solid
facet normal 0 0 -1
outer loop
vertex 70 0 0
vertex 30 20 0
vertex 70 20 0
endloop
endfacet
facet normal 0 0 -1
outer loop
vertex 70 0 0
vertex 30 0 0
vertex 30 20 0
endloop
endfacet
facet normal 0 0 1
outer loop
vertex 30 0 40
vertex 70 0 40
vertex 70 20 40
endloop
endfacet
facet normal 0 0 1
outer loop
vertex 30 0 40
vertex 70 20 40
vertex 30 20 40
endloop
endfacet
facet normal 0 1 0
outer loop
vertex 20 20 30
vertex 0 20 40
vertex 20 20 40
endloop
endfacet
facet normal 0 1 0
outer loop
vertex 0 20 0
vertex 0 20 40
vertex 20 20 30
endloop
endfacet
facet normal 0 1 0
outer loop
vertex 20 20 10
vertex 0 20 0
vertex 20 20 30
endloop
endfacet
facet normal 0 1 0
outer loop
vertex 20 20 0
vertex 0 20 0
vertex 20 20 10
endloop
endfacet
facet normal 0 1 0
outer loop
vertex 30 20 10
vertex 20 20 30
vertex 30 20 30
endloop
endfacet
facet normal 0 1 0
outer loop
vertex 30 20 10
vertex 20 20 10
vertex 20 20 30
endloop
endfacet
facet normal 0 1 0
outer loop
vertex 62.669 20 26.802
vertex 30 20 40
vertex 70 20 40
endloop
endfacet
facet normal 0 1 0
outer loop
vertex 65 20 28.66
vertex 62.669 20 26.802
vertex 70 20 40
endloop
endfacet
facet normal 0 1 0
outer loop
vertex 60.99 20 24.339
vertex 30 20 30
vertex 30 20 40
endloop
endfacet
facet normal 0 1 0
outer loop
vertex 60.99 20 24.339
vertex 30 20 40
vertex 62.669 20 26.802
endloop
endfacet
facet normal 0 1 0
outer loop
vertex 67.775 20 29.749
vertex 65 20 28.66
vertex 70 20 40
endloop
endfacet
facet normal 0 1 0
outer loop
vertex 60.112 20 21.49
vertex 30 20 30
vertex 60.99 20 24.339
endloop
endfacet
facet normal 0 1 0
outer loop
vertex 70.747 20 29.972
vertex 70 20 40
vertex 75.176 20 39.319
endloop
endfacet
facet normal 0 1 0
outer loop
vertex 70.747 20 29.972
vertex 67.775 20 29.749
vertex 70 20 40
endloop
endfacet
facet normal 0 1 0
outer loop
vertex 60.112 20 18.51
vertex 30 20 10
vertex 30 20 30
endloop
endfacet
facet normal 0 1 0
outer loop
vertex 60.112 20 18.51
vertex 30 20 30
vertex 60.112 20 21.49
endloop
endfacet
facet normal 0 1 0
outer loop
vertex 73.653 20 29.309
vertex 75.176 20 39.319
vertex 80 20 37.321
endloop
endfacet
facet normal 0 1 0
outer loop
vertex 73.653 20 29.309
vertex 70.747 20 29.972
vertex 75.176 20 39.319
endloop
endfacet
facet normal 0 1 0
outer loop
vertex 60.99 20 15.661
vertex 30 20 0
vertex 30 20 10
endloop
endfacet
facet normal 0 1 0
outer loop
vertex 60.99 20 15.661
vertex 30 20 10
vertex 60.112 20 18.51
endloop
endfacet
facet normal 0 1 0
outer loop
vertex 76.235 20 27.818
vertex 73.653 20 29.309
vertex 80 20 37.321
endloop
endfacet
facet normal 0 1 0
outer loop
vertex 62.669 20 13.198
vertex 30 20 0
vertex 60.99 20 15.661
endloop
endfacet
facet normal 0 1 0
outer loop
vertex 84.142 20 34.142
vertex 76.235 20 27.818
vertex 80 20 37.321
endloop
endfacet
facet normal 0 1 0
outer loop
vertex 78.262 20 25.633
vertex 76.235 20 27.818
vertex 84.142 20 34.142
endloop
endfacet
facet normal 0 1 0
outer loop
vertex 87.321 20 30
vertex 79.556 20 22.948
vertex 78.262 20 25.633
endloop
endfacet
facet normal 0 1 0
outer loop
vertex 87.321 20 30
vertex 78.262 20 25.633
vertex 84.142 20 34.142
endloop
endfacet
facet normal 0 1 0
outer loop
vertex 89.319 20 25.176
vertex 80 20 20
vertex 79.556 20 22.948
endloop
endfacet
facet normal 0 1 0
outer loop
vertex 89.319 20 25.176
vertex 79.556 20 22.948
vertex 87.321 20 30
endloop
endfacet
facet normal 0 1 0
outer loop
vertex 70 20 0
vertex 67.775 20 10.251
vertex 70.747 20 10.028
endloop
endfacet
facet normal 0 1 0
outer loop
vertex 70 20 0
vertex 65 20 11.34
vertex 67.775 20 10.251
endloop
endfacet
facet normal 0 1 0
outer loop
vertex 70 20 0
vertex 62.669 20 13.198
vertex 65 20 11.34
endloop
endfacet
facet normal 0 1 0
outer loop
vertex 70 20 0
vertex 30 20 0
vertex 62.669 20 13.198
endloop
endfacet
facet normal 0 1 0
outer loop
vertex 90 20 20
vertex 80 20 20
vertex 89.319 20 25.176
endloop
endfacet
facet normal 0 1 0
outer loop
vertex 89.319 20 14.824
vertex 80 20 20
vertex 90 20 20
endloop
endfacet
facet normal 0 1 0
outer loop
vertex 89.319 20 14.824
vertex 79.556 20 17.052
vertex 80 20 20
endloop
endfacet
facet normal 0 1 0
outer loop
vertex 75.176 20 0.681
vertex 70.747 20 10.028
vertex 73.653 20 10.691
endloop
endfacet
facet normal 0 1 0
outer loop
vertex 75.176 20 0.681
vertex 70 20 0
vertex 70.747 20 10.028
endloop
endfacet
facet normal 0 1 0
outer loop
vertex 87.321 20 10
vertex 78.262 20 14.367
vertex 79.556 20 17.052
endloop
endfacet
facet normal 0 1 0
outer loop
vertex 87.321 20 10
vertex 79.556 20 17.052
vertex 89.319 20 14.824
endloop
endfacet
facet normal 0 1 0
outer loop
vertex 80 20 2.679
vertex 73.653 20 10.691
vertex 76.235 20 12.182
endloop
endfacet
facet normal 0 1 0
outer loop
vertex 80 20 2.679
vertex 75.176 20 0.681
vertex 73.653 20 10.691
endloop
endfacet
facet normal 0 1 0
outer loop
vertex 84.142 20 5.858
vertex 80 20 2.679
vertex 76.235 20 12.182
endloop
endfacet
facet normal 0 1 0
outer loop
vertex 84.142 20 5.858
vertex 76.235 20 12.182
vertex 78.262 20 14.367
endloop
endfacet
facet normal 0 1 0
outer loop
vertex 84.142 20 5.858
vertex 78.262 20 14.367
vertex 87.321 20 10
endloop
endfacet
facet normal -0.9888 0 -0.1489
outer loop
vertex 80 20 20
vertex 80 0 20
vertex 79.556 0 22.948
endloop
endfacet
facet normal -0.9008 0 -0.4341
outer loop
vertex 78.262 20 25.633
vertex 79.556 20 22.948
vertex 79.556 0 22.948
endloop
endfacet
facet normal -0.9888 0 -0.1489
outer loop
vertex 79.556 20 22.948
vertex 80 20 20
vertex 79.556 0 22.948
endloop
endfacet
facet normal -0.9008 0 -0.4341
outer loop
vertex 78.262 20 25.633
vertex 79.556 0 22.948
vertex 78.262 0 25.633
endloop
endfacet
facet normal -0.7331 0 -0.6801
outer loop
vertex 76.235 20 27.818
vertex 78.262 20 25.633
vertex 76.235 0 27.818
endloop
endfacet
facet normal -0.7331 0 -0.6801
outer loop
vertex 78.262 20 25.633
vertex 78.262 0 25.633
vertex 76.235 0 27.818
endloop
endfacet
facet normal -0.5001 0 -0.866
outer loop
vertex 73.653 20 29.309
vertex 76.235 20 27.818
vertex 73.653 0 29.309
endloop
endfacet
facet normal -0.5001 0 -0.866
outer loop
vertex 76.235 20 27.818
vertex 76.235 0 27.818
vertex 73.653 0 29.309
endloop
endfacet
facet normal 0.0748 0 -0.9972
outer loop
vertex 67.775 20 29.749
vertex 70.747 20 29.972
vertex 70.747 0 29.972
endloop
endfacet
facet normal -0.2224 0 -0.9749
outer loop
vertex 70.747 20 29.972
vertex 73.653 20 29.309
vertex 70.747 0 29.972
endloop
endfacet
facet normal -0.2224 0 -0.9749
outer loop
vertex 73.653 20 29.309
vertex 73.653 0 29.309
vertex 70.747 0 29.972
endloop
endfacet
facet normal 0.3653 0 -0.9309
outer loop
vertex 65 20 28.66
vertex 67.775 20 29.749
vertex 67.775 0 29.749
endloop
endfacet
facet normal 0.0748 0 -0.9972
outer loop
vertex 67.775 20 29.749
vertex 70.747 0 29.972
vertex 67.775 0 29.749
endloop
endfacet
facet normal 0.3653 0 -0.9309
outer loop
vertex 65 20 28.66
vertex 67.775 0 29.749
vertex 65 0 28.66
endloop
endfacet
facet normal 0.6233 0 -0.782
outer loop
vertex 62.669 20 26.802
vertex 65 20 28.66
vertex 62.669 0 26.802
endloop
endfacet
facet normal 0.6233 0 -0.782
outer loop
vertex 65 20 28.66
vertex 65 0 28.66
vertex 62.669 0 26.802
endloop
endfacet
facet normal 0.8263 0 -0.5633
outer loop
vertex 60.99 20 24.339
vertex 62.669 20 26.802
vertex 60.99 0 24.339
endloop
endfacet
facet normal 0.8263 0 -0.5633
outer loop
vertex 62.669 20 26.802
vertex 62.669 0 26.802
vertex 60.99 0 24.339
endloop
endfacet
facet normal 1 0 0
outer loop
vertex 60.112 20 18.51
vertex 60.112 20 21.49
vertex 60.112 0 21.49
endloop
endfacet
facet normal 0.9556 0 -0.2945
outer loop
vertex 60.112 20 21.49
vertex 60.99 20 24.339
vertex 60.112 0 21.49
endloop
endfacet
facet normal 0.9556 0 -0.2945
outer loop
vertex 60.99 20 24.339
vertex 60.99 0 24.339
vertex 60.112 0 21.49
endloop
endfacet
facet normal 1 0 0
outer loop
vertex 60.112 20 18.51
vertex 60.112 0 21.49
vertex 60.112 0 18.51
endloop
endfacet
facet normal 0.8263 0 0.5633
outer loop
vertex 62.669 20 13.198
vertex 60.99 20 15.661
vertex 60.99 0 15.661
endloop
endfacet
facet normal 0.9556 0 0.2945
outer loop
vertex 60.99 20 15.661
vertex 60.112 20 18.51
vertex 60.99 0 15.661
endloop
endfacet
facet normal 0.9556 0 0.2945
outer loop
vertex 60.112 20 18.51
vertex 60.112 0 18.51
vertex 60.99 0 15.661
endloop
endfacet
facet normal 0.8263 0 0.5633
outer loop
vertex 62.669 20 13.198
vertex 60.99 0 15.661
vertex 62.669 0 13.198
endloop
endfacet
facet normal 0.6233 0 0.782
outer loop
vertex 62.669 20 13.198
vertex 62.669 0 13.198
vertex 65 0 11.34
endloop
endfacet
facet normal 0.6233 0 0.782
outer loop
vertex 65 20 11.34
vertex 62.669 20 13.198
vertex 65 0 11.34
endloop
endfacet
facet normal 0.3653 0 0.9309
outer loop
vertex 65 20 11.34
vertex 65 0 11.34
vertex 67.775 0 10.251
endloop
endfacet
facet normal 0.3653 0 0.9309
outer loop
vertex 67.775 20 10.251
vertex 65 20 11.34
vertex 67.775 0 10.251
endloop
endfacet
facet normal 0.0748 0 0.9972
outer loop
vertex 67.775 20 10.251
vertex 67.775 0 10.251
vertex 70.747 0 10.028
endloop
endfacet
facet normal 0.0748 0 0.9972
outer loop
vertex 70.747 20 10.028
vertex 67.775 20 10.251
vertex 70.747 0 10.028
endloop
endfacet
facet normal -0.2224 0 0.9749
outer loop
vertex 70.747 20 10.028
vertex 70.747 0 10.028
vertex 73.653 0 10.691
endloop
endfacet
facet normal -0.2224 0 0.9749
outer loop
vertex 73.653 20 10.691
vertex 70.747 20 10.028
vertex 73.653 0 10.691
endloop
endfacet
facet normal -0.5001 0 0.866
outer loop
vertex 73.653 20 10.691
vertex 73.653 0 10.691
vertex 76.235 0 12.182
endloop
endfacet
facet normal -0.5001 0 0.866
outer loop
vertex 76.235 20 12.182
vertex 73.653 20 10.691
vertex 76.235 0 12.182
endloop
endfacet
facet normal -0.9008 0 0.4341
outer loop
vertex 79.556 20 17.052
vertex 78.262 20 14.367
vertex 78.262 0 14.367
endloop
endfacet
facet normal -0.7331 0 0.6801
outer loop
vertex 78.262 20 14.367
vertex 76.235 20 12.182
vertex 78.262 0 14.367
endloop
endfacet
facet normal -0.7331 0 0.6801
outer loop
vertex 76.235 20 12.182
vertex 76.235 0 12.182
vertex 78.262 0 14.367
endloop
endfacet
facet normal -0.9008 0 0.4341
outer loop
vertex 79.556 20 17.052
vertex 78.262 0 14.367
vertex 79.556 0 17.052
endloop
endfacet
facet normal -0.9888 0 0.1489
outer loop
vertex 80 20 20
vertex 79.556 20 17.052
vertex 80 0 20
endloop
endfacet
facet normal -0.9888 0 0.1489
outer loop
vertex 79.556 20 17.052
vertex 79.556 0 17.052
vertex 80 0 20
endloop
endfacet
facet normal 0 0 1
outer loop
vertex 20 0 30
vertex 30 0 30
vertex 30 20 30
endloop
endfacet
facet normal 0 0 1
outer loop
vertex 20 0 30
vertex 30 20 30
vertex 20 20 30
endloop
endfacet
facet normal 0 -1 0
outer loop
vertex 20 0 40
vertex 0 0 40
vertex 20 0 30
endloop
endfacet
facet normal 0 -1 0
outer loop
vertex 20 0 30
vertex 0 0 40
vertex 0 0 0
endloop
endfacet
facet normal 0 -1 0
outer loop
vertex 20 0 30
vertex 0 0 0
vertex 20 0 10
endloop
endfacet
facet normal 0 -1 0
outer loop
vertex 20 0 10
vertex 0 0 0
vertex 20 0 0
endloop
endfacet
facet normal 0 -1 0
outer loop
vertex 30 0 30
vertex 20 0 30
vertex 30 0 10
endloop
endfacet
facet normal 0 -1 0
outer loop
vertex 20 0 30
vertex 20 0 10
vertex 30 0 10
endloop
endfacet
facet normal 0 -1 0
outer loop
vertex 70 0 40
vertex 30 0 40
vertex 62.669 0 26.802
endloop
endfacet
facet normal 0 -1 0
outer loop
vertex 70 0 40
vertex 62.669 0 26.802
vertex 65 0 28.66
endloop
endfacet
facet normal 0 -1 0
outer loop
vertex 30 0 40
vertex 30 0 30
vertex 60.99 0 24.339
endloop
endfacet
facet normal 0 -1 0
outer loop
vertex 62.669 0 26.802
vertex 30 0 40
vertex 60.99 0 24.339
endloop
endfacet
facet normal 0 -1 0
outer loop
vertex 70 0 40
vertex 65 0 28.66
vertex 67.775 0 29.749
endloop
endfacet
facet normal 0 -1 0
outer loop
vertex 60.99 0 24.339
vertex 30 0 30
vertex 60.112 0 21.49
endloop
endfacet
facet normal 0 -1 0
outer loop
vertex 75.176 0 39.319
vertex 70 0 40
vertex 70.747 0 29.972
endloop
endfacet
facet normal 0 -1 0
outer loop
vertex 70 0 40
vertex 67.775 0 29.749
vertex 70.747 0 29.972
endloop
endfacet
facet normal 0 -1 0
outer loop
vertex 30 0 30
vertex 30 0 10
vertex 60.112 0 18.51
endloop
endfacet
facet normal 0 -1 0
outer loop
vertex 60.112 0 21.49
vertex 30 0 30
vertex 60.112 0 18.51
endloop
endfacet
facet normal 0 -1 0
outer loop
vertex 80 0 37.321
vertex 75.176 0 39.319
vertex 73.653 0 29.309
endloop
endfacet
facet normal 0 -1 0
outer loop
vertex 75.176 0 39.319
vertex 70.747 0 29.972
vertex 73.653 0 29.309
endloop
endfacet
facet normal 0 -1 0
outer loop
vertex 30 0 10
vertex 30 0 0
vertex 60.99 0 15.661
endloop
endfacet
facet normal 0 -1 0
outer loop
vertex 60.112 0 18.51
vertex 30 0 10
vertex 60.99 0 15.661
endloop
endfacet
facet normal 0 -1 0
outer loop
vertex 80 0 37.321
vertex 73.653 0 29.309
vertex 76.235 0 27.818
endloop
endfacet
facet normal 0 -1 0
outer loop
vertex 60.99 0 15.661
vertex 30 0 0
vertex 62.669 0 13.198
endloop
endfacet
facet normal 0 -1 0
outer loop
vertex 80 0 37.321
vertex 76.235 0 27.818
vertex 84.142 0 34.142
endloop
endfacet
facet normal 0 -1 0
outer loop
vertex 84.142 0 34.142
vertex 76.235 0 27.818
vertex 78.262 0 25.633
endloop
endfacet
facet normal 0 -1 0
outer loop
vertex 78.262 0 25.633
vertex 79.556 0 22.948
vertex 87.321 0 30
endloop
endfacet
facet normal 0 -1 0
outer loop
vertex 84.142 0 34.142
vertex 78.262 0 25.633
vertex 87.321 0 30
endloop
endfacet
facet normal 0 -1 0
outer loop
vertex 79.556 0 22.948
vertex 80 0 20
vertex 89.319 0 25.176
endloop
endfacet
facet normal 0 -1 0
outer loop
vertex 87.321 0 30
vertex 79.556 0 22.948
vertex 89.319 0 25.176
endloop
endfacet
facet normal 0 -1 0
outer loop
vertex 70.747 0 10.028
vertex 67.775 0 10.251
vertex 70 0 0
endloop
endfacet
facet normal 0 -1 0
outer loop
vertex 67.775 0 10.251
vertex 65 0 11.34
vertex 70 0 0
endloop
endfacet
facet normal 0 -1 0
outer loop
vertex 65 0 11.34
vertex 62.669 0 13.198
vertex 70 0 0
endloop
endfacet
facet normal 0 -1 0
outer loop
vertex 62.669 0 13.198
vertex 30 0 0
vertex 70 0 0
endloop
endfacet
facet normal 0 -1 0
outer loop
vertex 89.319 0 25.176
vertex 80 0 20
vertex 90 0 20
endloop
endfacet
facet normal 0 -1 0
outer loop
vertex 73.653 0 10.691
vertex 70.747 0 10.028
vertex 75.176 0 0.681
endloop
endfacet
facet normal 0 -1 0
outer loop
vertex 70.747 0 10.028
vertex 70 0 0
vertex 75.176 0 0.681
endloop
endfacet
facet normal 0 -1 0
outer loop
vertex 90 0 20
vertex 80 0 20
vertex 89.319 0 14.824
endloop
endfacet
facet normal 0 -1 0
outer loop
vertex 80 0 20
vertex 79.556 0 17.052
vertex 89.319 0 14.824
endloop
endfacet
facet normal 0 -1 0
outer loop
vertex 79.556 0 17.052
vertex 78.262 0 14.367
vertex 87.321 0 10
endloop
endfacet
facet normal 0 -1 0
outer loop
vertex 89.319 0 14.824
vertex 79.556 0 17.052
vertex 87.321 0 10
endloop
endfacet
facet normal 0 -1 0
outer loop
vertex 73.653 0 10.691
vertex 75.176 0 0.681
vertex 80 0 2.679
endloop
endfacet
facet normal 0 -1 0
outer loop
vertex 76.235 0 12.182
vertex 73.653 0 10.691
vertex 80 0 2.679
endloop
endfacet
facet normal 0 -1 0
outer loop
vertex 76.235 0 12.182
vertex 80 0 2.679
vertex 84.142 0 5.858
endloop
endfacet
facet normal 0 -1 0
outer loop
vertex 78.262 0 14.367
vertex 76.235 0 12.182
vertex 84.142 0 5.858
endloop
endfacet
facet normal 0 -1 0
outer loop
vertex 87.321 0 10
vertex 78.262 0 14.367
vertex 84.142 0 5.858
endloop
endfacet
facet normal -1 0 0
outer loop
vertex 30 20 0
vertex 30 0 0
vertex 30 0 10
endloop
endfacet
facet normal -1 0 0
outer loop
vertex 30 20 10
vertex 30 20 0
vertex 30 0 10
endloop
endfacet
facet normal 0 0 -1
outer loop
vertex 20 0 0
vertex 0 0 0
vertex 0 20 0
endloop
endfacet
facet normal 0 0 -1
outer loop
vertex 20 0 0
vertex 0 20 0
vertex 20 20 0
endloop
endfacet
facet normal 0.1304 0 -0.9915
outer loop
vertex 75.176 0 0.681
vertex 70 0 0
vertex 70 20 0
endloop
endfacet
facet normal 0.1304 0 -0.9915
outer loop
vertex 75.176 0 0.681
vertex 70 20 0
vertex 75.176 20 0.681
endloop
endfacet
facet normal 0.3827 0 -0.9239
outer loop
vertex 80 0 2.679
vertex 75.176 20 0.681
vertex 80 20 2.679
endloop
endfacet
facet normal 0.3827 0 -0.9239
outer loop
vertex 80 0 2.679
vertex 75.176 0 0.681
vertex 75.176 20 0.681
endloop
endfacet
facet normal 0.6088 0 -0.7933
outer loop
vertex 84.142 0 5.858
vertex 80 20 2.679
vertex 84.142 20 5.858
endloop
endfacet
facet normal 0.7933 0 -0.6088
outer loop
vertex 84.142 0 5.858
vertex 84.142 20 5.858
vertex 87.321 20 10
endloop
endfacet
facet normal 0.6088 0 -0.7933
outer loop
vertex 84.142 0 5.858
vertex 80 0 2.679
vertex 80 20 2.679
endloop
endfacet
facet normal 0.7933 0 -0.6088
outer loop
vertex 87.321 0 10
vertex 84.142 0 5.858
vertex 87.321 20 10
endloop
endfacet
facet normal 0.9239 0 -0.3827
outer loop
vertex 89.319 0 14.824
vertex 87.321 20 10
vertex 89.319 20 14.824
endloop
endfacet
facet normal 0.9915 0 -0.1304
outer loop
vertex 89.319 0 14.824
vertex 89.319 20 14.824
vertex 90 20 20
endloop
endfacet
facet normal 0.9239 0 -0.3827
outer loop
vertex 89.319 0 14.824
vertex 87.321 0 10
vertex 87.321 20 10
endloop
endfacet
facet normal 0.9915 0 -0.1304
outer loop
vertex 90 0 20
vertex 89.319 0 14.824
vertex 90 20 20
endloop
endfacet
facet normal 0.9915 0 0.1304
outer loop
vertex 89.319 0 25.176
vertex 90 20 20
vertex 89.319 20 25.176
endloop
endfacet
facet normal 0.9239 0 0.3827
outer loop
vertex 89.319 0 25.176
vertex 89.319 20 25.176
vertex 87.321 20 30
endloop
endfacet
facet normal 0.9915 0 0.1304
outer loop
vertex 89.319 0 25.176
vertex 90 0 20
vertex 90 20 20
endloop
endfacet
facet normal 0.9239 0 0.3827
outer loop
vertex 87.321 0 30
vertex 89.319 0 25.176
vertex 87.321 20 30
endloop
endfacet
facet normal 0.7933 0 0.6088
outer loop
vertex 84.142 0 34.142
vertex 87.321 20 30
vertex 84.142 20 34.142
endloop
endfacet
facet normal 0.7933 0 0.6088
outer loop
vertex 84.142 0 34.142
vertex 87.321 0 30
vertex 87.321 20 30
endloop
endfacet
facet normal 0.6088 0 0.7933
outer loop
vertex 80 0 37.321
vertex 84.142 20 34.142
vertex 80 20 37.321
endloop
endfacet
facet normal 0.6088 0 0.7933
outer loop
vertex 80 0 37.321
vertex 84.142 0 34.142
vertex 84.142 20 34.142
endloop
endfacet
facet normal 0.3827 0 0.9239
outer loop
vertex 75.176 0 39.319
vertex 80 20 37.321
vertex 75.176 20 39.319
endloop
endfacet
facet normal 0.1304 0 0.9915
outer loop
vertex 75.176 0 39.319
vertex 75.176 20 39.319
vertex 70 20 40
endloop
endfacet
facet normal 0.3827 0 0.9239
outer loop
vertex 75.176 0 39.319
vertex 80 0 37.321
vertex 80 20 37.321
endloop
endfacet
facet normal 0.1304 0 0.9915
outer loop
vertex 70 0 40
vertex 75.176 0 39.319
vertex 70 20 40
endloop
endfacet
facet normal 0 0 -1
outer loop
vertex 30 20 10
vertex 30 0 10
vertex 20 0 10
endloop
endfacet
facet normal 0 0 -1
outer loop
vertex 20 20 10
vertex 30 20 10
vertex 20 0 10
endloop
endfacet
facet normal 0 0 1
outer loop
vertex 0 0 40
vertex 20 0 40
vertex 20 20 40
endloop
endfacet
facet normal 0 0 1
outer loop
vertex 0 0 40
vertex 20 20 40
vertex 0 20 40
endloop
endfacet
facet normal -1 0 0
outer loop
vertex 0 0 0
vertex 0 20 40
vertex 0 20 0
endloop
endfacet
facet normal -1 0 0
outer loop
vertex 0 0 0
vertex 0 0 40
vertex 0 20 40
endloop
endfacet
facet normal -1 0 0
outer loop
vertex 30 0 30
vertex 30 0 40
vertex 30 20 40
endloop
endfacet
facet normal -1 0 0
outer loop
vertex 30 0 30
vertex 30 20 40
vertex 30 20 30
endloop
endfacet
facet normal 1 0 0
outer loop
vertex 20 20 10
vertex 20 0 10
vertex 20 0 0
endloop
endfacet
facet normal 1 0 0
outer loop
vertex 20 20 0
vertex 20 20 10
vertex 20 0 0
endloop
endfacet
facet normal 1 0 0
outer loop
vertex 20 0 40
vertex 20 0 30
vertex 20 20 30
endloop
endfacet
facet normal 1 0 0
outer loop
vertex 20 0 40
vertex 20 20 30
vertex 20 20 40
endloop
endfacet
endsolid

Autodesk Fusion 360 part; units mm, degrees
sketch "Sketch1" plane through (0, 0, 0) normal (0, 1, 0) x (1, 0, 0)
  line L0 (50, 0) -> (50, -40)
  line L1 (0, -40) -> (0, 0)
  line L2 (0, 0) -> (20, 0)
  line L3 (30, 0) -> (30, -10)
  line L4 (30, -10) -> (20, -10)
  line L5 (20, -10) -> (20, 0)
  line L6 (0, 0) -> (20, 0)
  line L7 (30, 0) -> (50, 0)
  line L8 (30, -40) -> (30, -30)
  line L9 (30, -30) -> (20, -30)
  line L10 (20, -30) -> (20, -40)
  line L11 (50, -40) -> (30, -40)
  line L12 (20, -40) -> (0, -40)
  circle A0 centre (70, -20) radius 20
  line L13 (50, 0) -> (70, 0)
  line L14 (50, -40) -> (70, -40)
  circle A1 centre (70, -20) radius 10
  dimension "d1" = 50
  dimension "d2" = 40
  dimension "d3" = 20
  dimension "d4" = 10
  dimension "d5" = 10
  dimension "d6" = 20
  dimension "d7" = 10
  dimension "d8" = 10
  dimension "d9" = 20
extrude "Extrude1" add sketch "Sketch1" along normal blind 20
